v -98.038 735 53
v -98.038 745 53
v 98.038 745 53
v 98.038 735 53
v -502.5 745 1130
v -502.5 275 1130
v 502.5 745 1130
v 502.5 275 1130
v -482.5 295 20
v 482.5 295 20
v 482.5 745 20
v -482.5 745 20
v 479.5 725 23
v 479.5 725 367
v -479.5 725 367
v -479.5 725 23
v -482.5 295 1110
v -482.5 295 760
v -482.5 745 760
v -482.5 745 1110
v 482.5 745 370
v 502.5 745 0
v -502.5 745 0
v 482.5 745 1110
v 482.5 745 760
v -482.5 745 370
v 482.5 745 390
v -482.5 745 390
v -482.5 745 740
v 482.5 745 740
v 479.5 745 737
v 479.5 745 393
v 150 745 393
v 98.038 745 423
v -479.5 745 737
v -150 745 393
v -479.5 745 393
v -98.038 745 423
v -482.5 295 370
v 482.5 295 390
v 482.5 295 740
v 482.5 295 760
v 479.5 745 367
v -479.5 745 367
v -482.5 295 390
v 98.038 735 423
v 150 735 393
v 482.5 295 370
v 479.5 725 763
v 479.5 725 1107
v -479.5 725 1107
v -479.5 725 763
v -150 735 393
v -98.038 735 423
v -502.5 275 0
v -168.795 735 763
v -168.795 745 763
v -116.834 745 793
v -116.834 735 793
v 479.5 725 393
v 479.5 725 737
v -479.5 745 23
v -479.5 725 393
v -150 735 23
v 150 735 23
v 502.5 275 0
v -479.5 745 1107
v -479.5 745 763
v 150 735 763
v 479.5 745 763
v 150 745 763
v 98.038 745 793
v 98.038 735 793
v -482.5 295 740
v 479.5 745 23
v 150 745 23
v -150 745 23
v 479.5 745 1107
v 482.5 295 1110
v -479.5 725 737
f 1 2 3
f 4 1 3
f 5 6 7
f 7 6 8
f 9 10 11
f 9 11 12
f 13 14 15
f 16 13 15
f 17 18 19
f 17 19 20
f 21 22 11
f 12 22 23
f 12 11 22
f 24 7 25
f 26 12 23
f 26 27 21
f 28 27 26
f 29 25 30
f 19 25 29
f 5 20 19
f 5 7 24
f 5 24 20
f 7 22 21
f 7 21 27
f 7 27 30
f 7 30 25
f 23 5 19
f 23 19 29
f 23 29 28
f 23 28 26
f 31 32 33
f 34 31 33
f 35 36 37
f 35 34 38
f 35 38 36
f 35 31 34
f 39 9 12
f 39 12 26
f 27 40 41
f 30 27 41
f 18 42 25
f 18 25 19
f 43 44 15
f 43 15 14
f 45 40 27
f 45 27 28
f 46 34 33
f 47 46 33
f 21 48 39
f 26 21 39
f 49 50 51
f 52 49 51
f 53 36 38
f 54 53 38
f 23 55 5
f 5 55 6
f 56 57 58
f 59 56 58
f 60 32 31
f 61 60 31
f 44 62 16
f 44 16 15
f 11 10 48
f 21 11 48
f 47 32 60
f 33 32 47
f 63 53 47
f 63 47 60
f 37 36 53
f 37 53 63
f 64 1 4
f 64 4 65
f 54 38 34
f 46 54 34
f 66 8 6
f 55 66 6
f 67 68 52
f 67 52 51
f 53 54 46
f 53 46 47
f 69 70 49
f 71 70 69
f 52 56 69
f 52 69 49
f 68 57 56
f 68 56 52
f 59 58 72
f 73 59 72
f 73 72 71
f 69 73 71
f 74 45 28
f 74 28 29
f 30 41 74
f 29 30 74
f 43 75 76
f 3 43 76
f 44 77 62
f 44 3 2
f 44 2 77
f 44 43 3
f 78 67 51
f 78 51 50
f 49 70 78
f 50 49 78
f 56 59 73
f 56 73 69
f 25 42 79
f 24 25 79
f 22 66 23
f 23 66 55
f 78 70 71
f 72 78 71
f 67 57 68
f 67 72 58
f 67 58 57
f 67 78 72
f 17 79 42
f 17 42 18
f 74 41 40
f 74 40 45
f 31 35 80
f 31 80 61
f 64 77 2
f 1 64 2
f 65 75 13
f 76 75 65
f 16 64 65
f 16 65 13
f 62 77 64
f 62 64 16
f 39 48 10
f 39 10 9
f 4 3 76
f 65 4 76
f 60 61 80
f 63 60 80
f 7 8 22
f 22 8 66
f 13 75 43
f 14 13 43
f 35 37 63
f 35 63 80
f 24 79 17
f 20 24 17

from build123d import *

# Parameters (mm, degrees)
F0_W      = 1005
F0_H      = 550
F1_DEPTH  = 20
F2_W      = 1005
F2_H      = 20
F3_DEPTH  = 2200
F4_W      = 20
F4_H      = 530
F5_DEPTH  = 2200
F6_W      = 1005
F6_H      = 550
F7_DEPTH  = 20
F8_R      = 17.7646151172
F9_DEPTH  = 982.98
F10_W     = 1005
F10_H     = 1130
F11_DEPTH = 20
F12_W     = 965
F12_H     = 350
F13_DEPTH = 450
F14_W     = 479.5
F14_H     = 344
F15_DEPTH = 20
F17_DEPTH = 10
F19_DEPTH = 10
F21_DEPTH = 10
F22_W     = 1005
F22_H     = 2220
F23_DEPTH = 550


with BuildPart() as f1:
    # F0 (on Top) → F1 (new body)
    with BuildSketch(Plane.XY):
        Rectangle(F0_W, F0_H)
    extrude(amount=F1_DEPTH)

    # F2 (on face) → F3 (join)
    with BuildSketch(Plane.XY.offset(20)):
        with Locations((0, 265)):
            Rectangle(F2_W, F2_H)
    extrude(amount=F3_DEPTH)

    # F4 (on face) → F5 (join)
    with BuildSketch(Plane.XY.offset(20)):
        with Locations((-492.5, -10)):
            Rectangle(F4_W, F4_H)
        with Locations((492.5, -10)):
            Rectangle(F4_W, F4_H)
    extrude(amount=F5_DEPTH)

    # F6 (on face) → F7 (join)
    with BuildSketch(Plane.XY.offset(2220)):
        Rectangle(F6_W, F6_H)
    extrude(amount=-F7_DEPTH)

    # F8 (on face) → F9 (join)
    with BuildSketch(Plane(origin=(482.5, 0, 0), x_dir=(0, -1, 0), z_dir=(-1, 0, 0))):
        with Locations((0, 1643.2266235352)):
            Circle(F8_R)
    extrude(amount=F9_DEPTH)

    # F22 (on face) → F23 (cut)
    with BuildSketch(Plane.XZ.offset(275)):
        with Locations((0, 1110)):
            Rectangle(F22_W, F22_H)
    extrude(amount=-F23_DEPTH, mode=Mode.SUBTRACT)


with BuildPart() as f11:
    # F10 (on face) → F11 (new body)
    with BuildSketch(Plane(origin=(0, 275, 0), x_dir=(-1, 0, 0), z_dir=(0, 1, 0))):
        with Locations((0, 565)):
            Rectangle(F10_W, F10_H)
    extrude(amount=F11_DEPTH)

    # F12 (on face) → F13 (join)
    with BuildSketch(Plane(origin=(0, 295, 0), x_dir=(-1, 0, 0), z_dir=(0, 1, 0))):
        Polygon((502.5, 1130), (-502.5, 1130), (-502.5, 1110), (-502.5, 760), (-502.5, 740), (-502.5, 390), (-502.5, 370), (-502.5, 20), (-502.5, 0), (482.5, 0), (502.5, 0), (502.5, 20), (502.5, 370), (502.5, 390), (502.5, 740), (502.5, 760), (502.5, 1110), align=None)
        with Locations((0, 195)):
            Rectangle(F12_W, F12_H, mode=Mode.SUBTRACT)
        with Locations((0, 565)):
            Rectangle(F12_W, F12_H, mode=Mode.SUBTRACT)
        with Locations((0, 935)):
            Rectangle(F12_W, F12_H, mode=Mode.SUBTRACT)
    extrude(amount=F13_DEPTH)


with BuildPart() as f15:
    # F14 (on face) → F15 (new body)
    with BuildSketch(Plane(origin=(0, 745, 0), x_dir=(-1, 0, 0), z_dir=(0, 1, 0))):
        with Locations((239.75, 935)):
            Rectangle(F14_W, F14_H)
        with Locations((-239.75, 935)):
            Rectangle(F14_W, F14_H)
    extrude(amount=-F15_DEPTH)

    # F16 (on face) → F17 (cut)
    with BuildSketch(Plane(origin=(0, 745, 0), x_dir=(-1, 0, 0), z_dir=(0, 1, 0))):
        Polygon((-150, 763), (168.7952763235, 763), (116.8337520964, 793), (-98.0384757729, 793), align=None)
    extrude(amount=-F17_DEPTH, mode=Mode.SUBTRACT)


with BuildPart() as f15b:
    # F14 (on face) → F15, piece 2 (new body)
    with BuildSketch(Plane(origin=(0, 745, 0), x_dir=(-1, 0, 0), z_dir=(0, 1, 0))):
        with Locations((239.75, 565)):
            Rectangle(F14_W, F14_H)
        with Locations((-239.75, 565)):
            Rectangle(F14_W, F14_H)
    extrude(amount=-F15_DEPTH)

    # F18 (on face) → F19 (cut)
    with BuildSketch(Plane(origin=(0, 745, 0), x_dir=(-1, 0, 0), z_dir=(0, 1, 0))):
        Polygon((-150, 393), (0, 393), (0, 423), (-98.0384757729, 423), align=None)
        Polygon((0, 423), (0, 393), (150, 393), (98.0384757729, 423), align=None)
    extrude(amount=-F19_DEPTH, mode=Mode.SUBTRACT)


with BuildPart() as f15c:
    # F14 (on face) → F15, piece 3 (new body)
    with BuildSketch(Plane(origin=(0, 745, 0), x_dir=(-1, 0, 0), z_dir=(0, 1, 0))):
        with Locations((239.75, 195)):
            Rectangle(F14_W, F14_H)
        with Locations((-239.75, 195)):
            Rectangle(F14_W, F14_H)
    extrude(amount=-F15_DEPTH)

    # F20 (on face) → F21 (cut)
    with BuildSketch(Plane(origin=(0, 745, 0), x_dir=(-1, 0, 0), z_dir=(0, 1, 0))):
        Polygon((-150, 23), (0, 23), (0, 53), (-98.0384757729, 53), align=None)
        Polygon((0, 53), (0, 23), (150, 23), (98.0384757729, 53), align=None)
    extrude(amount=-F21_DEPTH, mode=Mode.SUBTRACT)


solid = Compound([f11.part, f15.part, f15b.part, f15c.part])
